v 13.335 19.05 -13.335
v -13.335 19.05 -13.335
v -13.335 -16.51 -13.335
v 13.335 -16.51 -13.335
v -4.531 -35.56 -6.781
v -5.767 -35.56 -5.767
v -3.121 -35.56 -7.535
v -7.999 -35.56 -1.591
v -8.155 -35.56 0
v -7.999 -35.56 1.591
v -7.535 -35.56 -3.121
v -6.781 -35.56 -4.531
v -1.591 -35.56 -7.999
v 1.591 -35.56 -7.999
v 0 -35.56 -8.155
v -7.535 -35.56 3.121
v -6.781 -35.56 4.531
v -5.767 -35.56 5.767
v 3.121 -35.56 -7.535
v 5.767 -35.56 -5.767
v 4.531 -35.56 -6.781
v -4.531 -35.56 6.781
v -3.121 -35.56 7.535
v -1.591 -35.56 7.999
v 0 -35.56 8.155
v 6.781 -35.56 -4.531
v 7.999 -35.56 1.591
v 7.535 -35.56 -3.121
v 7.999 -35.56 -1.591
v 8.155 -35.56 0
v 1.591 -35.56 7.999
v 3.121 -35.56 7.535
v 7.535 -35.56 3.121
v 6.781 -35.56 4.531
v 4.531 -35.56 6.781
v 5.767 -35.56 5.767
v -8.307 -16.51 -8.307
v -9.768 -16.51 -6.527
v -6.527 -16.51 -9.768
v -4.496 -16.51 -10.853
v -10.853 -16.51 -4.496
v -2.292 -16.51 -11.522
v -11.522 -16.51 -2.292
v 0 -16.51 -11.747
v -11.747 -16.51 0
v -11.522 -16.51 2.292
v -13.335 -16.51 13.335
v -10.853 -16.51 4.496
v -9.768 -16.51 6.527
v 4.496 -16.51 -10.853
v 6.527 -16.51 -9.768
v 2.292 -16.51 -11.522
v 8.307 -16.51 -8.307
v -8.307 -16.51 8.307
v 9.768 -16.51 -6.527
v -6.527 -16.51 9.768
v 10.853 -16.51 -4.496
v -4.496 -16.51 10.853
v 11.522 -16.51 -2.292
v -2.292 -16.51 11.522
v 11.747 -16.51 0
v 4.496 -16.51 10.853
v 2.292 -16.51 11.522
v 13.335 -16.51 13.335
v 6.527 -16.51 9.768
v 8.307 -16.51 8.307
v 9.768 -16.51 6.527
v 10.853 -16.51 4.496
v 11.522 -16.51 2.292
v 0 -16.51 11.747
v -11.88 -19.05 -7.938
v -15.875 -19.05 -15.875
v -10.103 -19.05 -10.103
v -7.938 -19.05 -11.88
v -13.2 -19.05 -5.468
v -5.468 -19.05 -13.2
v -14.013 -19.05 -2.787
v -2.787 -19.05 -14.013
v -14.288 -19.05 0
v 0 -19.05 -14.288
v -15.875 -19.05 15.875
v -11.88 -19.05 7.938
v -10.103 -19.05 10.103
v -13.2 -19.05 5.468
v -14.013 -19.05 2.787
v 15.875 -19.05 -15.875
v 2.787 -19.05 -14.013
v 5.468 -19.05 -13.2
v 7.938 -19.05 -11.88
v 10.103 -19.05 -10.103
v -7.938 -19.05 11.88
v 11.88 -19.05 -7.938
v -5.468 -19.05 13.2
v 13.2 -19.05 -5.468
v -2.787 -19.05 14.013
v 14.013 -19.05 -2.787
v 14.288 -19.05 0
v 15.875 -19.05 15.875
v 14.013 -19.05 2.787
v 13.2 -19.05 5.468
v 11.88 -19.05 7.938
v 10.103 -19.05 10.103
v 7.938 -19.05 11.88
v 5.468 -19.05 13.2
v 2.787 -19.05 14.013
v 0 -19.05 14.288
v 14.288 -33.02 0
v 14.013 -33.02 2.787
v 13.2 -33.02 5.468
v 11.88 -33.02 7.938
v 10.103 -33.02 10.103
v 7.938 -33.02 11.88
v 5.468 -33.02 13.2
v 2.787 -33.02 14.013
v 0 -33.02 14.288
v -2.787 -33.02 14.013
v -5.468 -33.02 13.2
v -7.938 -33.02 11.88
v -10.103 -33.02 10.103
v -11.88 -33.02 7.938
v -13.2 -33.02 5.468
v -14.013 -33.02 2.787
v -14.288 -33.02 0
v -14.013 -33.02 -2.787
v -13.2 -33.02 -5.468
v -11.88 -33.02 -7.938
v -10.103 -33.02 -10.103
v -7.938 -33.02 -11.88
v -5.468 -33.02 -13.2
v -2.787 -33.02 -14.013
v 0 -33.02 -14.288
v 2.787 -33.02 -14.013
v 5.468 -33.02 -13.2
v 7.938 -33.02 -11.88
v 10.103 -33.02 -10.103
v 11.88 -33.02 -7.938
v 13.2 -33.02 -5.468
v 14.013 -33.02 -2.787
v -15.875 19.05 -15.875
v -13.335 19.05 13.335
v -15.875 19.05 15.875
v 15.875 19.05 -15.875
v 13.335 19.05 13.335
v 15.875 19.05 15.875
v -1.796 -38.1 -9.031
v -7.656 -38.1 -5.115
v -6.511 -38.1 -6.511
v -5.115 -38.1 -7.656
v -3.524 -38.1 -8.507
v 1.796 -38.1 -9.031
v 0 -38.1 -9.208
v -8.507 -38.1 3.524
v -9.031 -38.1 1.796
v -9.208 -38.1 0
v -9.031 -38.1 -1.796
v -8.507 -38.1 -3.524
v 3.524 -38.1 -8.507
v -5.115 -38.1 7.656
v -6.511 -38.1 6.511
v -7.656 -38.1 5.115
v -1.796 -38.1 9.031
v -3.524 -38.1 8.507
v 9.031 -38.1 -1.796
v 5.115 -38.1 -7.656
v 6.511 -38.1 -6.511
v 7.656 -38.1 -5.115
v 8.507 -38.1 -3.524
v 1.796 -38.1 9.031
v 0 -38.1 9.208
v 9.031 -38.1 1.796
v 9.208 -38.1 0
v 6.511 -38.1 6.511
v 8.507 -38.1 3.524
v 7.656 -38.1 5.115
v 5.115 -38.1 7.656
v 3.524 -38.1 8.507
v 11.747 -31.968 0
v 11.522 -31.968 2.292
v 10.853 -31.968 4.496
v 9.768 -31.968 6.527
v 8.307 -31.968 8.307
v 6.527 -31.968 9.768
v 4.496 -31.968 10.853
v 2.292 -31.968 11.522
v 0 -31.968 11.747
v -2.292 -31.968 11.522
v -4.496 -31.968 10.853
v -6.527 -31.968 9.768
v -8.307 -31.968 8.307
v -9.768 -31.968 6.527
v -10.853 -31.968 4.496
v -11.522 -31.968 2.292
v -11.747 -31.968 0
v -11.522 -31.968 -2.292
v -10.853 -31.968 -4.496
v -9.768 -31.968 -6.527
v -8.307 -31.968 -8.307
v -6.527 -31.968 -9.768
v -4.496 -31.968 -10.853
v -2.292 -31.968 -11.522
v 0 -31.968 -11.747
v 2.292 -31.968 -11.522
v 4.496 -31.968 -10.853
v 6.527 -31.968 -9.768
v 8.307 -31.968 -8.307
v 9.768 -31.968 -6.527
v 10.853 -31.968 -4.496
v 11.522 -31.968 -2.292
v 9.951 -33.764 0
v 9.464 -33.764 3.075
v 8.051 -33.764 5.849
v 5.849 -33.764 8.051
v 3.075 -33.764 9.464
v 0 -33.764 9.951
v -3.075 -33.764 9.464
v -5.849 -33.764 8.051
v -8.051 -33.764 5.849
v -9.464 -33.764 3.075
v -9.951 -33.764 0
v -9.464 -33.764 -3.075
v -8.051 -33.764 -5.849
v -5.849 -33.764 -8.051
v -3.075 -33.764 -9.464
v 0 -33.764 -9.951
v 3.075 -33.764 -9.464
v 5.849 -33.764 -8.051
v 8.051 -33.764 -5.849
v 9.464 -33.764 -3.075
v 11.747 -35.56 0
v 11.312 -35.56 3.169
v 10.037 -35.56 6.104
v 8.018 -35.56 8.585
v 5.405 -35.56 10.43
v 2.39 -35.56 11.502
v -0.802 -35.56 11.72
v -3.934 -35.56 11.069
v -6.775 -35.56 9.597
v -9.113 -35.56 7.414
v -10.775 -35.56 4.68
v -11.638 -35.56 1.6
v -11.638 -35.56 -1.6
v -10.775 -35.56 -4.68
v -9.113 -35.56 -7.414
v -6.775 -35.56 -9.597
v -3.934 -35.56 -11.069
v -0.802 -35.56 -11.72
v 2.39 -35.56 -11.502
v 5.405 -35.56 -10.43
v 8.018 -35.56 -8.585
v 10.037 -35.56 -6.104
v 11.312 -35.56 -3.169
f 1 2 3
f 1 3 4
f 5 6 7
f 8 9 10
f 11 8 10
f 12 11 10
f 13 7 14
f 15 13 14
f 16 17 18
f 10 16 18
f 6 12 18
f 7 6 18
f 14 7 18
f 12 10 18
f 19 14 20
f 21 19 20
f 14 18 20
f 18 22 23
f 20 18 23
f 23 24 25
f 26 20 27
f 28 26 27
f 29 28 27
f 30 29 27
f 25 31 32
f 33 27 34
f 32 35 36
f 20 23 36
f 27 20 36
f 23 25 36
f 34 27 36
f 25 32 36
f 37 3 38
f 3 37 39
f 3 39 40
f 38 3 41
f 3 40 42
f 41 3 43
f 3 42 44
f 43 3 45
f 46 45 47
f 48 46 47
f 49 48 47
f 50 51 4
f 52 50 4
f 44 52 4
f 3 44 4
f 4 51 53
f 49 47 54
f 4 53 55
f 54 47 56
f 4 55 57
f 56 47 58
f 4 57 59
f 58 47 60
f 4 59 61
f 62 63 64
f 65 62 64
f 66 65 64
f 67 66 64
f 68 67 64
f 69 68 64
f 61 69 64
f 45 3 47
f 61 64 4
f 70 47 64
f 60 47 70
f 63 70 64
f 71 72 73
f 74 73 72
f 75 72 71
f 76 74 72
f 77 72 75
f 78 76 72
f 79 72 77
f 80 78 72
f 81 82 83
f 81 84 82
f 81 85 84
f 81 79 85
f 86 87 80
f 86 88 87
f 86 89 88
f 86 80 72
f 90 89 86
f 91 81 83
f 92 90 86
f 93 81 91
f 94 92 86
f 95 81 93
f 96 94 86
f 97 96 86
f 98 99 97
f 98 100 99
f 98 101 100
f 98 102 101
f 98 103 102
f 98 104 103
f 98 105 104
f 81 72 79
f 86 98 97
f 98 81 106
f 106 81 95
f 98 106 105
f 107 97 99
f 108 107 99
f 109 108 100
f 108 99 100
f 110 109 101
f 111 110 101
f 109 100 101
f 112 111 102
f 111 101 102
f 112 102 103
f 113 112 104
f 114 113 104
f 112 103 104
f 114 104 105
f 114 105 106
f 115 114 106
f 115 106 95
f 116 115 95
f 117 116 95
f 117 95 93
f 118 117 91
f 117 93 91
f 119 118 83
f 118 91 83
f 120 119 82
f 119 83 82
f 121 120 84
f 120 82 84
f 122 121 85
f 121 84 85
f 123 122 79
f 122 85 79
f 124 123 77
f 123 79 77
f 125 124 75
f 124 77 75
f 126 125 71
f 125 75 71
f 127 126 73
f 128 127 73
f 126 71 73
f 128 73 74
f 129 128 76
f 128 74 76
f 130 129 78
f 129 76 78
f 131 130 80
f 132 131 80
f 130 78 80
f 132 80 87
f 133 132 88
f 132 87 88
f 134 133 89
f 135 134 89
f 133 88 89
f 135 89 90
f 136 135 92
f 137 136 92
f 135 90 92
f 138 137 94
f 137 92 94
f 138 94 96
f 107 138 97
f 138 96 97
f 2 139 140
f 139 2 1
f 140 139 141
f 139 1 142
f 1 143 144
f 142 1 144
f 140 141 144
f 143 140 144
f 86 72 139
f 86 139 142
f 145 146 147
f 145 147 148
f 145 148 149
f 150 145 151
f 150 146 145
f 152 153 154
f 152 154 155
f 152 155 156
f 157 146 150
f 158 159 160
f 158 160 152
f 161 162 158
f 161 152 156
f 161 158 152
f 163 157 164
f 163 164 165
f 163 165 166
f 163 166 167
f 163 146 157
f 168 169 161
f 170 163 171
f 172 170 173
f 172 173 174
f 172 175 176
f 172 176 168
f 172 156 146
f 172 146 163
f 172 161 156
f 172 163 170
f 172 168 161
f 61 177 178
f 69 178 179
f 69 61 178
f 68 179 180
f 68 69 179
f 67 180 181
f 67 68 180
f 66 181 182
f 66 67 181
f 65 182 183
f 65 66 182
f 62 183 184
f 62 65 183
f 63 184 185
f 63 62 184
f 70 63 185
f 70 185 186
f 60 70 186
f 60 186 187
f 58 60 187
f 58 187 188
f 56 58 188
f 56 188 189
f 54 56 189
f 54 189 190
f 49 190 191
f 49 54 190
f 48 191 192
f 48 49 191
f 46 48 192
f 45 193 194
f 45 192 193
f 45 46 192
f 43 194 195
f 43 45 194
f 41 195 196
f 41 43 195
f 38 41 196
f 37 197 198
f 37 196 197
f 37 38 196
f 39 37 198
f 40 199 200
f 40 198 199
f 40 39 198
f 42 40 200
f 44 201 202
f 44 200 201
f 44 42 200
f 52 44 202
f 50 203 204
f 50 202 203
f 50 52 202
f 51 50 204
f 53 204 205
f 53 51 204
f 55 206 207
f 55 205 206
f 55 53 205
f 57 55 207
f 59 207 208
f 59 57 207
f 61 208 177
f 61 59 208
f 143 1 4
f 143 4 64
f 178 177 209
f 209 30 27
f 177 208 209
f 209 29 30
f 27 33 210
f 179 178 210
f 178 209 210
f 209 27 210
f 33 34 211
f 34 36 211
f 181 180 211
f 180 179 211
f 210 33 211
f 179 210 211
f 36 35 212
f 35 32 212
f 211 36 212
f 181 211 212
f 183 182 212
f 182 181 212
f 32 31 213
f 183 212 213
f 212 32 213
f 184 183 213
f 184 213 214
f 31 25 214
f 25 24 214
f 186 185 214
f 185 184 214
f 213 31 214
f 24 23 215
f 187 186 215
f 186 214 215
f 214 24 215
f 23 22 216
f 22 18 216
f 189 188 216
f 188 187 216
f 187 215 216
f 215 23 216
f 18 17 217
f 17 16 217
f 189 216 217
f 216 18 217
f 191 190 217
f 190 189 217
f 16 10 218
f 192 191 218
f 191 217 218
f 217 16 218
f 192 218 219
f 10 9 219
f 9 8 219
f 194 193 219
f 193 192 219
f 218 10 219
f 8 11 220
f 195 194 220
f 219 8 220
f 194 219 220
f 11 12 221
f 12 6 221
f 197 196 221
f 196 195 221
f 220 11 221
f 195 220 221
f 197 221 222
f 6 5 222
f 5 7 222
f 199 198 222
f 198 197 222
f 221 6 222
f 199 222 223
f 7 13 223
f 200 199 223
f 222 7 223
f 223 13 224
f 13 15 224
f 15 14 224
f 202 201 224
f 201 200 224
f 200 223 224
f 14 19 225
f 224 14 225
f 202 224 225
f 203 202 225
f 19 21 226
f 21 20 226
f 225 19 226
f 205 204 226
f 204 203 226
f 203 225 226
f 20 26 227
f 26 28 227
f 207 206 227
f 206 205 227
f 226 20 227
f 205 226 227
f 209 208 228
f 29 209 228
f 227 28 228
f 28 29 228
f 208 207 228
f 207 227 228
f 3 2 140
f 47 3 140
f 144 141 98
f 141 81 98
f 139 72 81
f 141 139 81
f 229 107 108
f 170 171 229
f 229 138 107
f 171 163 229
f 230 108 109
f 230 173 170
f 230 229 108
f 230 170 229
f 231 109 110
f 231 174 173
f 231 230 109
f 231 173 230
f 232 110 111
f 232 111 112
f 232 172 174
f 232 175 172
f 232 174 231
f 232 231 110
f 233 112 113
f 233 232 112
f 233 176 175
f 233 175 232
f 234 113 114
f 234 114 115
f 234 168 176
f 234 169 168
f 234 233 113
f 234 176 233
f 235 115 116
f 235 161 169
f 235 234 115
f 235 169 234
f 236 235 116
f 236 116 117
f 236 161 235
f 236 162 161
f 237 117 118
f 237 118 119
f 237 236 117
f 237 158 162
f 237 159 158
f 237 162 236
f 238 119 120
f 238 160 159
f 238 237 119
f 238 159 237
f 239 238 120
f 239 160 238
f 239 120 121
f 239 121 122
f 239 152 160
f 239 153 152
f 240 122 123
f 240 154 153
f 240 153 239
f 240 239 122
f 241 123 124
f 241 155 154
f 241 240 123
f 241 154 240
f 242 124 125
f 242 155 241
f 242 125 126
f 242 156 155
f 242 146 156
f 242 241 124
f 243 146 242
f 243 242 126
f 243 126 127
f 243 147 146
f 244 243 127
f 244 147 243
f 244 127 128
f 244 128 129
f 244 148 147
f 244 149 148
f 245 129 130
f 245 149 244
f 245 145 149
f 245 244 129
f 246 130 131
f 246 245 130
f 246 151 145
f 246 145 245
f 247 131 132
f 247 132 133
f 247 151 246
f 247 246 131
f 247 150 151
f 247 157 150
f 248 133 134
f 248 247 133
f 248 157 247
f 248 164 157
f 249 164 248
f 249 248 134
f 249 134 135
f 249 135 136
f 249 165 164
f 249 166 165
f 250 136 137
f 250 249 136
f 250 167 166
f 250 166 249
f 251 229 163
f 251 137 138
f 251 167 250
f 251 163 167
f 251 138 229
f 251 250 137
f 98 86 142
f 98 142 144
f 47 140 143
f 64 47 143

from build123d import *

# Parameters (mm, degrees)
F0_W     = 31.75
F0_H     = 31.75
F1_DEPTH = 19.05
F2_R     = 14.2875
F3_DEPTH = 19.05
F4_SIZE  = 5.08
F5_T     = -2.54


with BuildPart() as f1:
    # F0 (on Front) → F1 (new body, symmetric)
    with BuildSketch(Plane.XZ):
        Rectangle(F0_W, F0_H)
    extrude(amount=F1_DEPTH, both=True)

    # F2 (on face) → F3 (join)
    with BuildSketch(Plane.XZ.offset(19.05)):
        Circle(F2_R)
    extrude(amount=F3_DEPTH)

    # F4
    f4_edges = [f1.edges().sort_by_distance(p)[0] for p in [
        (-14.2875, -38.1, 0),
    ]]
    chamfer(f4_edges, length=F4_SIZE)

    # F5
    f5_openings = [f1.faces().sort_by_distance(p)[0] for p in [
        (0, 19.05, 0),
    ]]
    offset(amount=F5_T, openings=f5_openings, kind=Kind.INTERSECTION)


solid = f1.part
